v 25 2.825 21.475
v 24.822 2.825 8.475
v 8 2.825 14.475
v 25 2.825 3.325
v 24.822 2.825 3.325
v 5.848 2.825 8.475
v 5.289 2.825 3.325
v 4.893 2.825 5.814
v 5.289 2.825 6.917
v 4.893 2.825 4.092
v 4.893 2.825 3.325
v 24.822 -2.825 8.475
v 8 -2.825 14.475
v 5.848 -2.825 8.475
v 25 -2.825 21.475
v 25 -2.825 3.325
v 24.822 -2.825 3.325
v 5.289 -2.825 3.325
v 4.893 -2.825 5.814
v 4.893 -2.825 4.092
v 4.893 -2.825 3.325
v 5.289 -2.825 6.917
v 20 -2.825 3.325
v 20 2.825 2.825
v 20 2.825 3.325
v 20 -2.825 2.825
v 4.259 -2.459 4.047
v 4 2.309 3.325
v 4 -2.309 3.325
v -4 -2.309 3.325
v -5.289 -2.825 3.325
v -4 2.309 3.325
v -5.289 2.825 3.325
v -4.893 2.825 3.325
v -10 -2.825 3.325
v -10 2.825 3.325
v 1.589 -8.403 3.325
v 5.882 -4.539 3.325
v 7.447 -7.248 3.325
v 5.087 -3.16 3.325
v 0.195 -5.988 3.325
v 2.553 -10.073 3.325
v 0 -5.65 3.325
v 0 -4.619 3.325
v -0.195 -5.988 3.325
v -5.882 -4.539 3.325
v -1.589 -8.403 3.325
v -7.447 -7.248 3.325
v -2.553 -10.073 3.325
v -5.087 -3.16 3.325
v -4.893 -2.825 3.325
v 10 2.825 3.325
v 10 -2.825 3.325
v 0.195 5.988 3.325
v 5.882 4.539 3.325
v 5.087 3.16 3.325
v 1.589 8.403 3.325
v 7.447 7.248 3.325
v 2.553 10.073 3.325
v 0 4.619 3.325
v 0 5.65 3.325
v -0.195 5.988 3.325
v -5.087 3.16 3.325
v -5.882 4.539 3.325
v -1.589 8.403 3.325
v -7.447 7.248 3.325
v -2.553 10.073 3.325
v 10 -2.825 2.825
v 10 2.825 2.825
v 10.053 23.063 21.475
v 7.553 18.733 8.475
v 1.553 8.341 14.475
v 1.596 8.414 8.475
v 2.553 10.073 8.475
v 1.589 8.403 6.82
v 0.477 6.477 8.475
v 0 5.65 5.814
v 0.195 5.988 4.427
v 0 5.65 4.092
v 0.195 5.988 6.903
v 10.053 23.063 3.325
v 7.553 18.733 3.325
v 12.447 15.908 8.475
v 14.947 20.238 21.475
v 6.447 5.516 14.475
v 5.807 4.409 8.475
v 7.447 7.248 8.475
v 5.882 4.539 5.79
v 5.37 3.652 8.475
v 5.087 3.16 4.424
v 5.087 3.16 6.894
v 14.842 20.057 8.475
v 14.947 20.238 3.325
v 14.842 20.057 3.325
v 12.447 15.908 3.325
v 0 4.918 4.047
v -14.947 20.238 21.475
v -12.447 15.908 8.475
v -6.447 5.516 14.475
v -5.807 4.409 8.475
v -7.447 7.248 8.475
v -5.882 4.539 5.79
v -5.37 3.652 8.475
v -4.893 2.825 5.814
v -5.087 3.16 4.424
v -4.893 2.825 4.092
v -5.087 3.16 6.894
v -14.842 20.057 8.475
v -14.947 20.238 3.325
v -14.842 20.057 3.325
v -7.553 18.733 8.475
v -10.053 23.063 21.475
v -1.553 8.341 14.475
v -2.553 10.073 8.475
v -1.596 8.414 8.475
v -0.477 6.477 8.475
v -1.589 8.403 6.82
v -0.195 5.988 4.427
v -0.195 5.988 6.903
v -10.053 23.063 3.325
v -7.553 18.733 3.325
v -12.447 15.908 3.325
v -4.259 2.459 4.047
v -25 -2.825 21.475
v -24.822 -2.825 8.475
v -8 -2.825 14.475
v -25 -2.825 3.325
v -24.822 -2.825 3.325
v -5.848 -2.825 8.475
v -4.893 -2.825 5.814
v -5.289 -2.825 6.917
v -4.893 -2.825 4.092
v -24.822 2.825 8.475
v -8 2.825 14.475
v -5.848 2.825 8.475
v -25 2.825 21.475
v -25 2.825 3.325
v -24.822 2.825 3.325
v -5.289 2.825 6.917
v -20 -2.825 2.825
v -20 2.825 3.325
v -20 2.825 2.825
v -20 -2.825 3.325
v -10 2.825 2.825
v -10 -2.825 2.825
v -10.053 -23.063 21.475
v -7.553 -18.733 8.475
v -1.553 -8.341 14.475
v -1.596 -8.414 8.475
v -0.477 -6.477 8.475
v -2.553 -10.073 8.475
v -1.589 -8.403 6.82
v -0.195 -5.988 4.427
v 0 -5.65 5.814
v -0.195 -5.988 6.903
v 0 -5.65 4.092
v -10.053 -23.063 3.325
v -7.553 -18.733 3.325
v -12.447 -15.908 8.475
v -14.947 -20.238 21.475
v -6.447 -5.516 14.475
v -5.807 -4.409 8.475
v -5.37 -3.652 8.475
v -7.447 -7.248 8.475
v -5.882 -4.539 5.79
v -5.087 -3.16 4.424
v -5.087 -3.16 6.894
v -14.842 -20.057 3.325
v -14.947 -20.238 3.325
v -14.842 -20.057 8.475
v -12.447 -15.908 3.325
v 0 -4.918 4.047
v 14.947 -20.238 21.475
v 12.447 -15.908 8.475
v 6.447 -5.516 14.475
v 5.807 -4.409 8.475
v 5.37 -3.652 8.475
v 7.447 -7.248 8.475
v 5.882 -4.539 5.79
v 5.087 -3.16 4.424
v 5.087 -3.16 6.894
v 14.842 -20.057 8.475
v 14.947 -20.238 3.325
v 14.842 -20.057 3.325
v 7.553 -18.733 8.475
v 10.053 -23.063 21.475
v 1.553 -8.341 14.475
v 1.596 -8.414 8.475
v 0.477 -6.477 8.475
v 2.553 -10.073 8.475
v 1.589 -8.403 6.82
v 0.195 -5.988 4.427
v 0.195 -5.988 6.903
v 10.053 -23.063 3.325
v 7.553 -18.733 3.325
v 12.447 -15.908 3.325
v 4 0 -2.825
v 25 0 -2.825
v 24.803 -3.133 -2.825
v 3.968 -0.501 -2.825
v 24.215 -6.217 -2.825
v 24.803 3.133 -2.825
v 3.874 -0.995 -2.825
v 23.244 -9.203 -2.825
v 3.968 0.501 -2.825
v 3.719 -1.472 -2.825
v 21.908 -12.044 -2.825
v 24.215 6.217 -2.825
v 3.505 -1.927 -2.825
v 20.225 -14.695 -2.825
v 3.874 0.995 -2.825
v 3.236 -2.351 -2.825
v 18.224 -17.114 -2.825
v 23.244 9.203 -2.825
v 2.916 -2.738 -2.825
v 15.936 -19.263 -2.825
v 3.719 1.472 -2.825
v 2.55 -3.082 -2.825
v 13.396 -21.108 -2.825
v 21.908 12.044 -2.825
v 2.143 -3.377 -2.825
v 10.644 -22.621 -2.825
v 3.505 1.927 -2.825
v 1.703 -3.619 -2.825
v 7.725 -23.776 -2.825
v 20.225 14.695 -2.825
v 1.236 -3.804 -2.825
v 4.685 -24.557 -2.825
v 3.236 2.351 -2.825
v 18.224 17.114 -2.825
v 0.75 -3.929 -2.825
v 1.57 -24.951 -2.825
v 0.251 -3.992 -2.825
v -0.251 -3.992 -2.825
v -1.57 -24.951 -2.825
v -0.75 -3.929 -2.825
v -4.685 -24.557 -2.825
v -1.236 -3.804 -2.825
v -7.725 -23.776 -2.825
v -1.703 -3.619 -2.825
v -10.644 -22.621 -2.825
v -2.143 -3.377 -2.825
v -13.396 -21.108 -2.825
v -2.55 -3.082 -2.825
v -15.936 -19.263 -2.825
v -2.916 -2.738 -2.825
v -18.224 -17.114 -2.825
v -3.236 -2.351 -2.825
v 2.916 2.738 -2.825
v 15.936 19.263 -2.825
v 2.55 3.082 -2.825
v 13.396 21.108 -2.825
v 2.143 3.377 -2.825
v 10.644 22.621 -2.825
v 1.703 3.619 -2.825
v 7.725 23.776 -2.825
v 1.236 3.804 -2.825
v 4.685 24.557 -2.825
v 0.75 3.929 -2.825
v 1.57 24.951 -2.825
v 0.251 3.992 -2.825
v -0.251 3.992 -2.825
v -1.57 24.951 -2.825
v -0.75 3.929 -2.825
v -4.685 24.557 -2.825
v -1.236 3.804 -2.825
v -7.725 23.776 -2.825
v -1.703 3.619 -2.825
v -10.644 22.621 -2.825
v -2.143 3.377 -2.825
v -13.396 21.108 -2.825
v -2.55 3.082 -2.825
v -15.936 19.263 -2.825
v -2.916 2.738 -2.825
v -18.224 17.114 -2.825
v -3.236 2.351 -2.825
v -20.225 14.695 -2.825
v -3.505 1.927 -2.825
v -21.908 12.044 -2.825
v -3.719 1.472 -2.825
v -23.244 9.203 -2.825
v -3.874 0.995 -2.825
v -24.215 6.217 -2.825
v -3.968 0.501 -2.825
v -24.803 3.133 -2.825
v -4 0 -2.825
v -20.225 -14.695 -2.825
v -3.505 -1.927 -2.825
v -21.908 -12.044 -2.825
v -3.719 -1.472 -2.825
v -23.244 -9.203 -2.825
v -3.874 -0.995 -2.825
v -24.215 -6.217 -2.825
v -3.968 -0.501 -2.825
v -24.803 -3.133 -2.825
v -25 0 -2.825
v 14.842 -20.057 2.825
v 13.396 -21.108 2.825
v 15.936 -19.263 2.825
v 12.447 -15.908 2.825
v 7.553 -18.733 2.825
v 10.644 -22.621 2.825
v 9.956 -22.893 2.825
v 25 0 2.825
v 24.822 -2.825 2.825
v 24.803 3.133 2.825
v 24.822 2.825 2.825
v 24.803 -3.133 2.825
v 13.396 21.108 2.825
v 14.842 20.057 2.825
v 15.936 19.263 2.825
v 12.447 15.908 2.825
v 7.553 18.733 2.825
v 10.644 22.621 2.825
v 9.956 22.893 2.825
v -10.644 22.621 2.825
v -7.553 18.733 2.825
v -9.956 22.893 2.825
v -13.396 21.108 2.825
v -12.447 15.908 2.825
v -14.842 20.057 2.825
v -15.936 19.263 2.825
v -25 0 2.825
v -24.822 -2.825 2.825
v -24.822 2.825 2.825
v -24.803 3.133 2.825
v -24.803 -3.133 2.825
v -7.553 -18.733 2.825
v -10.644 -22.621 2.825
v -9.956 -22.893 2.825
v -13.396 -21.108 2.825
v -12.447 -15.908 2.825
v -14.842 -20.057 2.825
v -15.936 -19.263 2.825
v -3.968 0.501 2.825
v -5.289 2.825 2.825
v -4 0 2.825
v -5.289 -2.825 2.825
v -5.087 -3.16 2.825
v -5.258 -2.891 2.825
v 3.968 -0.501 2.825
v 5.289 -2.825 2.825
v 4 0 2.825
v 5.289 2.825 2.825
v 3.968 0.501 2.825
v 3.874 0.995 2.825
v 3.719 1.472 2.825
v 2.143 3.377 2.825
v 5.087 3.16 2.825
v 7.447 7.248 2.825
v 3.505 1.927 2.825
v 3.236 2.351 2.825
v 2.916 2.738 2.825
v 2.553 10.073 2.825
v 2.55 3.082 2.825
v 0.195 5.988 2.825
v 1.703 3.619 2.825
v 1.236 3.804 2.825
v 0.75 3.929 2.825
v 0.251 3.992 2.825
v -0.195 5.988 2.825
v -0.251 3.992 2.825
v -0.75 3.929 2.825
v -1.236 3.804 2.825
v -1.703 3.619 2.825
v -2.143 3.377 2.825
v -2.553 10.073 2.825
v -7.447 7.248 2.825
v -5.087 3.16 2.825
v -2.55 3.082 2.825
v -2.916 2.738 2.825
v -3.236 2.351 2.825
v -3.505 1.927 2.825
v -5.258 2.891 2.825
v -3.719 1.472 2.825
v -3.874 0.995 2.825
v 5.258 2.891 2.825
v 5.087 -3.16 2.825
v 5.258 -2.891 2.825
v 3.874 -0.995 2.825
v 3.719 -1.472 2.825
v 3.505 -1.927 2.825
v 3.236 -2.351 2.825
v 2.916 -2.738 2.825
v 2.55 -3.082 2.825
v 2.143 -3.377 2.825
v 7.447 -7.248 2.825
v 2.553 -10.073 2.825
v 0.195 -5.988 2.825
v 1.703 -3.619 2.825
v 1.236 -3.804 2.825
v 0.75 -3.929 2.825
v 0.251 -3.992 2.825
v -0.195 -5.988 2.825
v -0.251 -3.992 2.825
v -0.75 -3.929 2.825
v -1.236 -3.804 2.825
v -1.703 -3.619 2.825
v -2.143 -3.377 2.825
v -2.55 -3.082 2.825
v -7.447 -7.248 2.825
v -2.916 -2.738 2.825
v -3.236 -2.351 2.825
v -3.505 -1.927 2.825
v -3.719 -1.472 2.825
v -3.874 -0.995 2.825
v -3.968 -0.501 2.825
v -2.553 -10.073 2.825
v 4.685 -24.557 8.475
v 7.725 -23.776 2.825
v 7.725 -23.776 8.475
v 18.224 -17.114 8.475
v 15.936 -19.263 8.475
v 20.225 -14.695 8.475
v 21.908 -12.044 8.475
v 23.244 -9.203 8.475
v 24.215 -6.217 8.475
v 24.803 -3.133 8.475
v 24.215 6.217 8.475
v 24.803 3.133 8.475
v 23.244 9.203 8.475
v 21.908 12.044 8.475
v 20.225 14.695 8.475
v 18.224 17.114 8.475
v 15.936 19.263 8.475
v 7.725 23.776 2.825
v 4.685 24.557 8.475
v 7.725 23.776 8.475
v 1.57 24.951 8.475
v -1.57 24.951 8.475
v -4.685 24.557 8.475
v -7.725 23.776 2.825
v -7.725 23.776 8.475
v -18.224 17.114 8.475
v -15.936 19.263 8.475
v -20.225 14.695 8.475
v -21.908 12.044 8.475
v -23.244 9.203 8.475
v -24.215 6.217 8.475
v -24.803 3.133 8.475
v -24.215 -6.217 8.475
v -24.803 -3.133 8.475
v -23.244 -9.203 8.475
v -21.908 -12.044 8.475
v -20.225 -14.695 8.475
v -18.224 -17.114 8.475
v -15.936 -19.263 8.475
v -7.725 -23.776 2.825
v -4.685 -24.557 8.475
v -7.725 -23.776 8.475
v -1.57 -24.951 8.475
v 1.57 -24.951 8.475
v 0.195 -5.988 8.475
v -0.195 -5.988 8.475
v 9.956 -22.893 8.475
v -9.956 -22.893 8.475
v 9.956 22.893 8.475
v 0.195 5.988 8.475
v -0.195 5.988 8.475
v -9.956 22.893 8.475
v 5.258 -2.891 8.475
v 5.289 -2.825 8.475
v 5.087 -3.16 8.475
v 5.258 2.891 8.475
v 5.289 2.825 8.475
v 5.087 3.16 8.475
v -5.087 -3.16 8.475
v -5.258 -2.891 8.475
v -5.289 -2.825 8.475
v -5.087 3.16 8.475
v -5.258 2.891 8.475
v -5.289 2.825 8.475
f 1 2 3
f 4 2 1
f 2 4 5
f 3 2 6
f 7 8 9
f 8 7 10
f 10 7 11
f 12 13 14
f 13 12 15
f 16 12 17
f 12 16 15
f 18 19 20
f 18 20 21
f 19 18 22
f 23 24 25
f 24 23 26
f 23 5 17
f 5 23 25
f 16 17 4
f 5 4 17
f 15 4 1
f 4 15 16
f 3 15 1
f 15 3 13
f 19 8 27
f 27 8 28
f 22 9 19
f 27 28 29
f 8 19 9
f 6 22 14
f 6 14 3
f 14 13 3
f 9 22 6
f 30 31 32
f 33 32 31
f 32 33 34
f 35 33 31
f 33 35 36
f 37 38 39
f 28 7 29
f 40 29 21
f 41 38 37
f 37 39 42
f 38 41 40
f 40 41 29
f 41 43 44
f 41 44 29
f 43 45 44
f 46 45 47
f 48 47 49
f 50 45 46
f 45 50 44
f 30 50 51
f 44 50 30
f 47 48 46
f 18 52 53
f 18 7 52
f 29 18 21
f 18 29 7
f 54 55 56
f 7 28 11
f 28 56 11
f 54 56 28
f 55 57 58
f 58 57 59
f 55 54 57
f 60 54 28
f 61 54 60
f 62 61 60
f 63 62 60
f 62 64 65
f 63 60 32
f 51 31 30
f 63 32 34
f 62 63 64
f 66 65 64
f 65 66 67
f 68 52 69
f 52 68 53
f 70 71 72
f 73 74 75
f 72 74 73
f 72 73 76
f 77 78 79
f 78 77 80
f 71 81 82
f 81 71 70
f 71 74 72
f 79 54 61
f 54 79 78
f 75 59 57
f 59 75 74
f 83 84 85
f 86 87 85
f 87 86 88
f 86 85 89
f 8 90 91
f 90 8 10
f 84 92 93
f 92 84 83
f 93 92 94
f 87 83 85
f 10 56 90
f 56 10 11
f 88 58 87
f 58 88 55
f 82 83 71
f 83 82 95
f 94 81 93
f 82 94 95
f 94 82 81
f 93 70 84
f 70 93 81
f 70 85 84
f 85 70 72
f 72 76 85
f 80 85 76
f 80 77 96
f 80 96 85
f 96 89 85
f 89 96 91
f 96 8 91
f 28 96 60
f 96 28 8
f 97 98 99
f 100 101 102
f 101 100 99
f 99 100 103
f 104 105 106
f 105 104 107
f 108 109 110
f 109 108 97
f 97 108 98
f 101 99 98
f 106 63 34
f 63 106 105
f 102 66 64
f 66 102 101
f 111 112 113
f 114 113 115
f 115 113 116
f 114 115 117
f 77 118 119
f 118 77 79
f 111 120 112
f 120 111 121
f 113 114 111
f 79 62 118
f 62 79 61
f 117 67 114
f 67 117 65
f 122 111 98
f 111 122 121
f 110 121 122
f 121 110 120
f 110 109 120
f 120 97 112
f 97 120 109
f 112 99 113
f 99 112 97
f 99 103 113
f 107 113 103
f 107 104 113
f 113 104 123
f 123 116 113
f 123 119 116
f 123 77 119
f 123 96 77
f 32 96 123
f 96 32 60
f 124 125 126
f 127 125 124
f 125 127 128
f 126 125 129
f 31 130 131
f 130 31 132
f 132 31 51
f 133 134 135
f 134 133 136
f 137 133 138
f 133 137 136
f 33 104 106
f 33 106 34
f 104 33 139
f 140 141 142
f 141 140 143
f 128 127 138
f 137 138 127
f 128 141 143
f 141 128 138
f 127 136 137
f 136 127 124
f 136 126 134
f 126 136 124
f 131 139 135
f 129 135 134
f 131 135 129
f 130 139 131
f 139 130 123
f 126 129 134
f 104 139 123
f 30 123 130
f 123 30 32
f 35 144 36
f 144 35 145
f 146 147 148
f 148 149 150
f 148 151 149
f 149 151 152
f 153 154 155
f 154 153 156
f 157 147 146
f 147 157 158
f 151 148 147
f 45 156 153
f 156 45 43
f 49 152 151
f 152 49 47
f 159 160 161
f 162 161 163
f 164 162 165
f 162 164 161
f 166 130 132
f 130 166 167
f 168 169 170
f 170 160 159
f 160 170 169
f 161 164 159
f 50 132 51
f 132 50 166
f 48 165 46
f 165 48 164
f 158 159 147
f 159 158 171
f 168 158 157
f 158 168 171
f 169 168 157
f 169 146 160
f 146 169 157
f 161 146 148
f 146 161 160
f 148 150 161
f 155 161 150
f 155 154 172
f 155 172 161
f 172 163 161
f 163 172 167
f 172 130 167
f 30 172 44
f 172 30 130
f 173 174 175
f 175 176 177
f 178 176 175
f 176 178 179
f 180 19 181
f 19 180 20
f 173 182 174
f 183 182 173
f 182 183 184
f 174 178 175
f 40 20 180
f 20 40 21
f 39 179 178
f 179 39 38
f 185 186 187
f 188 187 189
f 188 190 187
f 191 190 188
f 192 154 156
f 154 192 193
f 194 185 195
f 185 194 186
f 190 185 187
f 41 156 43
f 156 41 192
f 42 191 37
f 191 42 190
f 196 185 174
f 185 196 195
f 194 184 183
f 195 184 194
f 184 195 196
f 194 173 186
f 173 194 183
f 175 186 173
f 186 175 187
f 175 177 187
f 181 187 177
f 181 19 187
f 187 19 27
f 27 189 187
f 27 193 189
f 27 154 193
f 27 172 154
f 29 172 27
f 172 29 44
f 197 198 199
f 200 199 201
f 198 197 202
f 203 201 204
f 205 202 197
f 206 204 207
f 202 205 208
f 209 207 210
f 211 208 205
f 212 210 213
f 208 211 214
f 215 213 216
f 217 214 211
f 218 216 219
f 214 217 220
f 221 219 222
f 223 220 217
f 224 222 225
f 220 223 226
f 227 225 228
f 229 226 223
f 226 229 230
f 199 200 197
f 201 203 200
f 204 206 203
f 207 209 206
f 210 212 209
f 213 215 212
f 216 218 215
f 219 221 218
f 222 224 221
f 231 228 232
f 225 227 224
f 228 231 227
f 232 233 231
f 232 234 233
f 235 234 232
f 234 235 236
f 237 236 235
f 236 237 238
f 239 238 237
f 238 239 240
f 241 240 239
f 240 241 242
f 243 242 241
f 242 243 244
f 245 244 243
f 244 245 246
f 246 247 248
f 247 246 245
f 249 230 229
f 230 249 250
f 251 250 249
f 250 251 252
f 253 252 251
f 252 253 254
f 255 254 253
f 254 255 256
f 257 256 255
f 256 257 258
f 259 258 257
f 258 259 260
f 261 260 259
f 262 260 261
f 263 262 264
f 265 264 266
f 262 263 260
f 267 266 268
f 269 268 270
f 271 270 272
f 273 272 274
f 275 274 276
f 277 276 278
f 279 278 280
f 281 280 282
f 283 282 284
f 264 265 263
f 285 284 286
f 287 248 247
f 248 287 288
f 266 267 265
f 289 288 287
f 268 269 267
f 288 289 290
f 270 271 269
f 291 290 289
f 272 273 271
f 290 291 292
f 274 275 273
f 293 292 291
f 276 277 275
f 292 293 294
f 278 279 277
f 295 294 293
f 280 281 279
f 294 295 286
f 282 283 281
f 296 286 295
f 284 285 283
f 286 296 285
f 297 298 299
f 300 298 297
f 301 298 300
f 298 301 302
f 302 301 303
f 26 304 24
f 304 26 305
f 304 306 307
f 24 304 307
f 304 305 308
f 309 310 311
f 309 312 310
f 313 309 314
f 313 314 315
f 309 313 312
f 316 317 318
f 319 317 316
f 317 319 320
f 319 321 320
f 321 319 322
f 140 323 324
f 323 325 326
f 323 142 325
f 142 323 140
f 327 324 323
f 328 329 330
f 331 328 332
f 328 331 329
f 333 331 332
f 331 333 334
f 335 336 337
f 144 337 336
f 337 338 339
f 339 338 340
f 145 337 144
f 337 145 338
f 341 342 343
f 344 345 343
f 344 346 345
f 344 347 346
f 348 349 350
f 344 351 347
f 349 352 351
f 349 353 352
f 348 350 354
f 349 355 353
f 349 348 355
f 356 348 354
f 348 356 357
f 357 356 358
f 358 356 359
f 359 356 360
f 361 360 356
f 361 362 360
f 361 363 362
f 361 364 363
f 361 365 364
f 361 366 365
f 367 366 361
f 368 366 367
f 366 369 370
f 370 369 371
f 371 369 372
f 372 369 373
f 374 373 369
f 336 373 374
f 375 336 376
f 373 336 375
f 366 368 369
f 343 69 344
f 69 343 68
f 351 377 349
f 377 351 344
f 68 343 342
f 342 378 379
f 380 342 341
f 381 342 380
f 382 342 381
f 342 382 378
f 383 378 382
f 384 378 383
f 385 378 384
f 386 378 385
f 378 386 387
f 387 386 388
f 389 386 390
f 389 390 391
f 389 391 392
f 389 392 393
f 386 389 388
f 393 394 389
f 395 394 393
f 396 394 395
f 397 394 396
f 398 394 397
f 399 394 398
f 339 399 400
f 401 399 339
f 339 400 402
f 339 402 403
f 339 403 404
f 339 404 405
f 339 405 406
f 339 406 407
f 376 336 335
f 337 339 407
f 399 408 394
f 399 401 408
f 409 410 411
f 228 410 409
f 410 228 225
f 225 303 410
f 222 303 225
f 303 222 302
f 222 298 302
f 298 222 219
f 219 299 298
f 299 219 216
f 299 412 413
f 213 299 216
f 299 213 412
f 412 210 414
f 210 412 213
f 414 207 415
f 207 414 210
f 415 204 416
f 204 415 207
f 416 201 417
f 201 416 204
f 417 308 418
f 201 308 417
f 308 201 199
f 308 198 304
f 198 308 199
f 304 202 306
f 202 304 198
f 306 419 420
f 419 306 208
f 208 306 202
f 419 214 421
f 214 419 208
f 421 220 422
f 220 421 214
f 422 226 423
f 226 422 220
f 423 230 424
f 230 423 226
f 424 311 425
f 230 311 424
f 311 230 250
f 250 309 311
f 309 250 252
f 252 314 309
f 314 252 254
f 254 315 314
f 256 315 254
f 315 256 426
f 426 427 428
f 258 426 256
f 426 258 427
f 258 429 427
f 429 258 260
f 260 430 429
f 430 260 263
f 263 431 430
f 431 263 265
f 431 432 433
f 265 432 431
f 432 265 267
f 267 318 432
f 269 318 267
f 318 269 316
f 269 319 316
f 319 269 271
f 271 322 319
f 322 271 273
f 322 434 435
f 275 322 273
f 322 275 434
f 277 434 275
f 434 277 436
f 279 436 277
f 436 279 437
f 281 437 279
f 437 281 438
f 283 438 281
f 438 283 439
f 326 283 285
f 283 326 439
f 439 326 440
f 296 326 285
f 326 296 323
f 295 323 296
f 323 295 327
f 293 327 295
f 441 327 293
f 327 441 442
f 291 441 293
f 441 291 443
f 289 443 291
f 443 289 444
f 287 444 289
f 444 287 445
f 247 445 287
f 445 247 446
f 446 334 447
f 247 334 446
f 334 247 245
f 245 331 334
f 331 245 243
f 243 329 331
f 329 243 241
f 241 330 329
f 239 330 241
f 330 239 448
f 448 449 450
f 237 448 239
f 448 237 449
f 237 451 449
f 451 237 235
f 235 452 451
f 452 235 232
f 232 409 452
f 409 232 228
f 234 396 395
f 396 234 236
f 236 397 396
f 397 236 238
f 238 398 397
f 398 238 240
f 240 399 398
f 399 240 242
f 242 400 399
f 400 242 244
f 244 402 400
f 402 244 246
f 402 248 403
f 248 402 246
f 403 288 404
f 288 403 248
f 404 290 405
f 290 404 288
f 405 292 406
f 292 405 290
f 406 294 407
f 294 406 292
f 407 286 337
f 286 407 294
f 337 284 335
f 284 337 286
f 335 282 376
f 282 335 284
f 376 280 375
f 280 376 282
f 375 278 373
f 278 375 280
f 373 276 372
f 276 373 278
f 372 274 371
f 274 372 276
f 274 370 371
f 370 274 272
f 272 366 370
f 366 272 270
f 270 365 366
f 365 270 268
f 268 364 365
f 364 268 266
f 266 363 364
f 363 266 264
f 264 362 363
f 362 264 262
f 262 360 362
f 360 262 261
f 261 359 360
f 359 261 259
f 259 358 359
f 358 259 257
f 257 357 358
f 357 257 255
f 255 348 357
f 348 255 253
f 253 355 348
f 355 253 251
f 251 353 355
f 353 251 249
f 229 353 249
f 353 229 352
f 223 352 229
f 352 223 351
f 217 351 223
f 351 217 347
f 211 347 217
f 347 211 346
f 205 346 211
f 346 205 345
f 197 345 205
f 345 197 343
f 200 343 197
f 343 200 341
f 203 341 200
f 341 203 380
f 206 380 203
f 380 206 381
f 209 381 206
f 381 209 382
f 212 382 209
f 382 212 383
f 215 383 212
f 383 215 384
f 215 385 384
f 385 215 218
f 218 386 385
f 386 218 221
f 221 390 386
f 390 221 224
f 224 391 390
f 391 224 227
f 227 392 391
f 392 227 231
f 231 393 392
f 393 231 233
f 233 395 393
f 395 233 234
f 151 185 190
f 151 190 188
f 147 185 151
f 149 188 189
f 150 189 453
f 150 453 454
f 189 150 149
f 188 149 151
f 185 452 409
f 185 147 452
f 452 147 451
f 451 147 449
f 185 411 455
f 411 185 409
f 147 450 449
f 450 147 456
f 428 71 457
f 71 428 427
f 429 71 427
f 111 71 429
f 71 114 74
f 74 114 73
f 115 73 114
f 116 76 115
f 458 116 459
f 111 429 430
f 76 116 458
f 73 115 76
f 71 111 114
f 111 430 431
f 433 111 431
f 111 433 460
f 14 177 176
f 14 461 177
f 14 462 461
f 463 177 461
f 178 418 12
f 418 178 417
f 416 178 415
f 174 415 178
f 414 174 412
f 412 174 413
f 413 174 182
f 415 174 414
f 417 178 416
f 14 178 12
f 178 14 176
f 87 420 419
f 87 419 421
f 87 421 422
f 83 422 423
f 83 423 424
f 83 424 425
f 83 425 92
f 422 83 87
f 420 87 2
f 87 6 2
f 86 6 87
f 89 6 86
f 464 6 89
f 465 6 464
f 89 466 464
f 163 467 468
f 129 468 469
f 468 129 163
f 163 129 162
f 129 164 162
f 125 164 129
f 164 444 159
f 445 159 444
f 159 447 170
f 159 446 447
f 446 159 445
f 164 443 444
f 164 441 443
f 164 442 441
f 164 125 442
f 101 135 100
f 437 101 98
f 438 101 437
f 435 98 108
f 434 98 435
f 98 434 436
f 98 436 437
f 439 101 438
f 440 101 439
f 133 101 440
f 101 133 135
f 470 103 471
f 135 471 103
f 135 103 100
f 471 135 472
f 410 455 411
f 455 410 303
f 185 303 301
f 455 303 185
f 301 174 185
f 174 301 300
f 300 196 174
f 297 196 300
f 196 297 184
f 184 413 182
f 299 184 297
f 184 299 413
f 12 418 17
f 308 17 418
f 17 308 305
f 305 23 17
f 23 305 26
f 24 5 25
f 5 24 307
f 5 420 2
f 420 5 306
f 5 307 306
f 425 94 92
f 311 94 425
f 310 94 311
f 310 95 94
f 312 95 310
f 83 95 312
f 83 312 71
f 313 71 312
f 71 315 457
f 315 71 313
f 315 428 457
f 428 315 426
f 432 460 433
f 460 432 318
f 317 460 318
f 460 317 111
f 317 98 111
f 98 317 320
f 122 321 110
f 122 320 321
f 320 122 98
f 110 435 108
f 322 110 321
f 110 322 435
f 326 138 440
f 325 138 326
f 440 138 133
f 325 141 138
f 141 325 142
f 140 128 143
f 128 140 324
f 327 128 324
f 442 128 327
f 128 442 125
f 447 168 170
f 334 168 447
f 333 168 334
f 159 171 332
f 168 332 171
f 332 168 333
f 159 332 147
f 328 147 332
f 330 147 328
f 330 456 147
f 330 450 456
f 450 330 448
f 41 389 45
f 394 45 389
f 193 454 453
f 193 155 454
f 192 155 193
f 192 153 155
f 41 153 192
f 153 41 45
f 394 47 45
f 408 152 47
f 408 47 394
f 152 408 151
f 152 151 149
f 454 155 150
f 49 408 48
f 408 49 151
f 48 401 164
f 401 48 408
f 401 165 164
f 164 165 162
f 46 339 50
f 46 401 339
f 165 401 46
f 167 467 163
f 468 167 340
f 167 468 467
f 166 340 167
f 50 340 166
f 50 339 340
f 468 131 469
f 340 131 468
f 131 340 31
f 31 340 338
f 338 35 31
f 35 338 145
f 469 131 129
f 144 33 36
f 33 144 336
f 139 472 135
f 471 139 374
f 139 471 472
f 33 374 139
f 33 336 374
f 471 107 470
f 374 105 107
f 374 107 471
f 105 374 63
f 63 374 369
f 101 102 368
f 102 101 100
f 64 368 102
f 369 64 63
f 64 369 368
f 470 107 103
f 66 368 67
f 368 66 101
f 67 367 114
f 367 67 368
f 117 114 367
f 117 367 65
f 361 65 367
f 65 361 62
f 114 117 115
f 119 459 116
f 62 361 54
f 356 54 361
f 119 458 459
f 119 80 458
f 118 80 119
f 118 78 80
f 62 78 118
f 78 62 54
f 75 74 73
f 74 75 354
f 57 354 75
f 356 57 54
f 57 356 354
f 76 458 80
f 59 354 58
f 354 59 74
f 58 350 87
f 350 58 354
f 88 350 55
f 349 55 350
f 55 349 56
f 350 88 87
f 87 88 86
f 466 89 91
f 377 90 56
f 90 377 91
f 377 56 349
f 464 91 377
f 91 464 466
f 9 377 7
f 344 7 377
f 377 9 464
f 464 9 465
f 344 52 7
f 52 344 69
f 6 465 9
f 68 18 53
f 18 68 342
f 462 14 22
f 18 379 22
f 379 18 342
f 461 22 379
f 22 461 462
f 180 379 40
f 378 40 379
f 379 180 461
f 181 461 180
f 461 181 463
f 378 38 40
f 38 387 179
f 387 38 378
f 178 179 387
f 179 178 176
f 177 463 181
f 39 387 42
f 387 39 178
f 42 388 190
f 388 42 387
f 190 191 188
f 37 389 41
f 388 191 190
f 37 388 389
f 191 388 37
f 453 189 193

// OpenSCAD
// file: formulas.scad
  
//Distance between 2 points
function distance(p1, p2) = sqrt(pow(p2[0]-p1[0], 2) + pow(p2[1]-p1[1], 2));
  
// distance between 2 arc end points
function arc_distance(r, depth) = sqrt(8*r*depth - 4*pow(depth, 2));
// file: 2dTimingPulleyCutout.scad
include <dimensions.scad>;

// By Rob Gilson
// Based on a script by Erik de Bruijn <reprap@erikdebruijn.nl> 
// License: GPLv2 or later
//
// Goal: the goal of this parametric model is to generate a high quality custom timing pulley that is cuttable by a laser cutter or 3 axis cnc mill.
// NOTE: The diameter of the gear parts are determined by the belt's pitch and number of teeth on a pully.

// //////////////////////////////
// USER PARAMETERS
// //////////////////////////////

// Pulley properties
//shaftDiameter = 4.85; // the shaft at the center, will be subtracted from the pulley. Better be too small than too wide.
//numTeeth = 11; // this value together with the pitch determines the pulley diameter
//toothType = 3; // 1 = slightly rounded, 2 = oval sharp, 3 = square. For square, set the toothWith a little low. (TODO, not yet implemented)
//
//// Belt properties:
//pitch = 2; // distance between the teeth
//beltThickness = 1.2; // thickness of the part excluding the notch depth!
//beltWidth = 5; // the width/height of the belt. The (vertical) size of the pulley is adapted to this.
//notchDepth = 2.4-1.2; // make it slightly bigger than actual, there's an outward curvature in the inner solid part of the pulley
//toothWidth = 2; // Teeth of the PULLEY, that is.

//Nut Trap Properties
//screwWidth = 1.5; //The width of the screw hole (make this slightly larger then the screw)
//The width and length of the nut to make the nut trap
//nutWidth = 3; //The width of the nut trap (dimension perpendicular to the screw)
//nutLength = 2;//The length of the nut trap (dimension along the screw)

//Assembly properties:
//sideScrews = true; //If true generates 2 screw holes through the lenght of the pulley to use to hold it together instead of gluing the layers together.
//setScrew = true; //if true generates a nut trap for a set screw to hold the pulley to the motor shaft.

//Layer Material properties:
//materialThickness = 5.95; //TODO: the thickness of your layer material (to determine how many layers to cut)

//DXF Generation options (allows cutting of individual components)
//pulley = true; //enables rendering of the pulley
//beltguide = true;//enables rendering of the belt guide

// //////////////////////////////
// OpenSCAD SCRIPT
// //////////////////////////////

$fs=0.2; // def 1, 0.2 is high res 
$fa=3; //def 12, 3 is very nice


//Pulley Component
module pulley() {
}

// Cogs plate
module pulley_cogs(numTeeth=11, shaftDiameter=4.95, materialThickness=6, screwWidth=3/2) {
  pulleyRadius = pitch*numTeeth/(PI*2) - notchDepth; 
  shaftRadius = shaftDiameter/2;
  //	for (layer = [0:(beltWidth/materialThickness)])
  //		translate(v = [(pulleyRadius+notchDepth+1)*layer*2,0,0]) 

  linear_extrude(materialThickness) {
  pulleyOutline(pulleyRadius, shaftRadius, pulleyRadius, screwWidth);
  for ( i = [0:numTeeth] ) {
      rotate(a = [0,0,i*360/numTeeth])
      {
          translate(v = [pulleyRadius, 0, 0])
          {
              //tooth profile (toothType = 2)
              square(size = [notchDepth,toothWidth], center = true);
              translate(v = [notchDepth*0.5, 0, 0])
                  scale([notchDepth/4, toothWidth/2, 1]) 
                      circle(r=1);
          }
      }
   }
  }
}

//Nut Trap Clamp/Belt Guide Component
module pulley_beltguide(numTeeth=11, shaftDiameter=4.95, materialThickness=6, screwWidth=3/2) {
  pulleyRadius = pitch*numTeeth/(PI*2) - notchDepth; 
  shaftRadius = shaftDiameter/2;
  linear_extrude(materialThickness)
  pulleyOutline(pulleyRadius+notchDepth+beltThickness, shaftRadius, pulleyRadius, screwWidth);
}

//Nut Trap Component
module pulley_setscrew() {
  difference()
  {
    pulleyOutline(pulleyRadius+notchDepth, shaftRadius, pulleyRadius);
    union()
    {
      translate([0,-screwWidth/2])
        square([pulleyRadius+notchDepth,screwWidth], center=false);
      translate([(pulleyRadius+shaftRadius+notchDepth)/2,0])
        square([nutLength,nutWidth], center=true);
    }
  }
}

//Pulley Outline Module
module pulleyOutline(r, shaftRadius, pulleyRadius, screwWidth)
{
	difference()
	{
		circle(r=r, center=true); //outer
		union()
		{
			circle(r=shaftRadius, center=true); //shaft
				translate([0,(pulleyRadius+shaftRadius)/2,0])
				circle(screwWidth,true);
				translate([0,-(pulleyRadius+shaftRadius)/2,0])
				circle(screwWidth,true);
		}
	}
}

pulley_beltguide(62, 8, 6, 3/2);
translate([0, 0, 6]) pulley_cogs(62, 8, 6, 3/2);
// file: dimensions.scad
use <formulas.scad>;

$fn=50;
export_fn=100;
export_scale=0.03937; // scales down mm->inches (useful if your laser cutter uses inches)
cut_diam=0.2;

// Global
PI = 3.15159265; 


span_bottle=100; 
bottle_rod_diam=10; 
front_rod_diam=10; 
width=470;
span_bottom=160; // Bottom rods span
span_bottle=120; // Bottle rods span
board_thickness=5.65;
nut_t=6;
back_tilt_angle=20;

cable_diam=1.7;

bushings_diam=15;
bushings_length=24;
bushings_hole_length=24.2;

strap_hole_dim=[4, 2];
strap_margin=3;

// Bottle grip
bottle_axle_diam=8;
bottle_axle_pos=[span_bottom-sin(back_tilt_angle)*span_bottle/2, cos(back_tilt_angle)*span_bottle/2];

bottle_grip_bottom_diam=90;
bottle_grip_bottom_height=6;
bottle_grip_bottom_cone_height=4;

bottle_grip_top_diam=50;
bottle_grip_top_height=7;
bottle_grip_top_cone_height=20;
bottle_grip_top_diam=50;
bottle_grip_top_inner_diam=45;
bottle_pulley_teeth=62;


// Sides
holes_margin=25; 
axle_position=[0,0];
break_position=[70, 50];
axis_z=40;
bearing_extrusion_height=7.2;
bearing_extrusion_length=24;
bearing_axle_length=20;
bearing_id=8;

//x_top_rod_position=[0,bottle_axle_pos[1] + x_rods_span/2];
bottom_extrusion_height=5;
bottle_top_rod_position=[span_bottom-sin(back_tilt_angle)*span_bottle, cos(back_tilt_angle)*span_bottle];

// Right wall
bottle_axis_diam=15;
stepper_slide_distance=0;
a_stepper_pos=[span_bottom*0.4, 10];
stepper_rotation=0; //atan((bottle_axle_pos[1]-a_stepper_pos[1])/(bottle_axle_pos[0]-a_stepper_pos[0]));


// Left wall

// X table
x_carriage_pos=width/5;
x_a_distance=85;
x_table_tilt=0;
x_rods_span=50;
rod_ext=8;
table_rod_ext=0;
table_rods_diam=8;

// X stepper mount
x_stepper_mount_length = 50;
x_stepper_mount_width = x_rods_span + 10;
x_stepper_mount_shift=(22-9)/2;

x_table_width=width - board_thickness*2;

// X carriage
//carriage_length= 24; // single bushing
carriage_length=65; // double bushings
carriage_height=x_rods_span+20;
carriage_rounding_radius = 10;
carriage_bushing_hole_width = 10.5;
z_rods_length=70;
z_rods_diam=8;
z_bar_width=20;
z_pos=-10;
z_bushings_diam=15;
z_bolt_diam=3;
z_rods_span=41;
z_bushings_pos = x_rods_span/2;
solenoid_dim = [27, 22, 25];
solenoid_pos=0;
plate_distance = sqrt(pow(bushings_diam/2, 2) - pow(carriage_bushing_hole_width/2, 2)) + board_thickness/2; // Calculates plate distance (depending on carriage_bushing_hole_width
echo("Plate distance:", plate_distance*2 + board_thickness);
z_plate_dist = 5;
z_bushings_hole_width = 2*sqrt(pow(bushings_diam/2, 2) - pow(z_plate_dist, 2));

// Calculations for x table position
xz_span = plate_distance + z_plate_dist + board_thickness/2;
x_top_rod_position=[bottle_axle_pos[0] - cos(x_table_tilt)*(x_a_distance) + sin(x_table_tilt)*(-xz_span), bottle_axle_pos[1] + sin(x_table_tilt)*(x_a_distance) + cos(x_table_tilt)*(-xz_span)];
x_btm_rod_position=[bottle_axle_pos[0] - cos(x_table_tilt)*(x_a_distance + x_rods_span) + sin(x_table_tilt)*(-xz_span), bottle_axle_pos[1] + sin(x_table_tilt)*(x_a_distance + x_rods_span) + cos(x_table_tilt)*(-xz_span)];

toolbit_mount_diam=4.8;

// Bottle
bottle_pos=40;
bottle_diam=100;
bottle_height=360;

// Bottle bar
bottle_bar_width=40;
bottle_bar_height=span_bottle;
bottle_bar_pos=bottle_height+bottle_pos+30;

bearing_hole_diam=13;
bearing_guide_diam=22;


// Pulley properties
shaftDiameter = 8; // the shaft at the center, will be subtracted from the pulley. Better be too small than too wide.
hubDiameter = 30; // if the hub or timing pulley is big enough to fit a nut, this will be embedded.
hubHeight = 8; // the hub is the thick cylinder connected to the pulley to allow a set screw to go through or as a collar for a nut.
flanges = 2; // the rims that keep the belt from going anywhere
hubSetScewDiameter = 0; // use either a set screw or nut on a shaft. Set to 0 to not use a set screw.
numSetScrews = 3;
bottle_pulley_teeth = ceil(7.1*16); // this value together with the pitch determines the pulley diameter
echo("Teeth:", bottle_pulley_teeth);

toothType = 1; // 1 = slightly rounded, 2 = oval sharp, 3 = square. For square, set the toothWith a little low.

// Belt properties:
pitch = 2; // distance between the teeth
beltWidth = 6; // the width/height of the belt. The (vertical) size of the pulley is adapted to this.
beltThickness = 0.63; // thickness of the part excluding the notch depth!
notchDepth = 0.75; // make it slightly bigger than actual, there's an outward curvature in the inner solid part of the pulley
toothWidth = 1.2; // Teeth of the PULLEY, that is.
pulleyRadius = pitch*bottle_pulley_teeth/(PI*2) - notchDepth;

a_stepper_teeth=11;
a_stepper_pulley_radius=4.2;


// Belt tensioner
echo(belt_tensioner_position[1], "Tensioner position");
echo(a_stepper_pulley_radius, "11t radius");
belt_tensioner_bolt_diam=7.8;
belt_tensioner_elevation=8;
belt_tensioner_stroke=10;
belt_tensioner_axle_margin=3;
belt_tensioner_xpos = 105;
belt_tensioner_position=[belt_tensioner_xpos, a_stepper_pos[1] - a_stepper_pulley_radius + (bottle_axle_pos[1] - pulleyRadius - a_stepper_pos[1] + a_stepper_pulley_radius)/(bottle_axle_pos[0] - a_stepper_pos[0])*(belt_tensioner_xpos-a_stepper_pos[0]) + belt_tensioner_stroke/2 - 22/2];
// main file
include <dimensions.scad>;
use <2dTimingPulleyCutout.scad>;

/*
module btm_grip_support() {
  t = board_thickness-0.2;
  margin = 5;
  linear_extrude(t, center=true)
  union() {
    difference() {
      union() {
        translate([0, t + margin]) scale([bottle_grip_bottom_diam/2, bottle_grip_bottom_height]) circle();
        square([bottle_grip_bottom_diam/2, t + margin]);
      }
      union() {
        mirror([1, 0, 0]) square([1000, 1000]);
        mirror([0, 1, 0]) translate([-500, 0, 0]) square([1000, 1000]);
       translate([0, -1]) square([bottle_axle_diam/2 + 1, t + 2]);
       translate([0, t]) square([14.2/2, bottle_grip_bottom_height + margin + 1]);
       translate([bottle_axle_diam + 5, -1]) square([t*2, t+1]);
       translate([bottle_grip_bottom_diam/2 - t - 4, -1]) square([t, t+1]);
       square([bottle_grip_bottom_diam/2 - t - 4, 0.5]);
      }
    }
  points=[[0, 0], [-5, 0], [0, -3]];
  translate([bottle_grip_bottom_diam/2, 0]) polygon(points);
  //translate([bottle_axle_diam + 1, 0]) mirror([1, 0, 0]) polygon(points);
  }
  
}
*/

module btm_grip_support() {
  t = board_thickness;
  l=bottle_grip_bottom_diam/2;
  margin=6;

  points = [
    [bottle_axle_diam/2, 0.5],
    [15, 0.5],
    [15, t],
    [20, t],
    [20, 0.5],
    [30, 0.5],
    [30, t],
    [35, t],
    [35, 0.5],
    [l, 0.5],
    [l, t + margin],
    [16/2, t + margin + bottle_grip_bottom_height],
  ];

  linear_extrude(t, center=true)
    polygon(points);
}

module top_grip_support() {
  t = board_thickness;
  l=bottle_grip_top_diam/2;
  margin=6;

  points = [
    [bottle_axle_diam/2, 0.5],
    [10, 0.5],
    [10, t],
    [20, t],
    [20, 0.5],
    [30, 0.5],
    [l, 0.5],
    [l, t + margin + bottle_grip_top_height],
    [16/2, t + margin],
  ];

  linear_extrude(t, center=true)
    polygon(points);
}

module top_plate() {
  t = board_thickness;
  linear_extrude(board_thickness, center=true)
  difference() {
    circle(r=bottle_grip_top_diam/2);
    circle(r=bottle_axle_diam/2 + 2);
    union() {
      for (i=[0:6]) {
        rotate(i*360/6, [0, 0, 1])
          projection(cut=true) translate([0, 0, -t/2]) rotate([90, 0, 0]) top_grip_support();
      }
    }
  }
}

/*module btm_plate() {
  t = board_thickness - 0.2;
  linear_extrude(board_thickness, center=true)
  difference() {
    circle(r=bottle_grip_bottom_diam/2);
    circle(r=bottle_axle_diam/2 + 2);
    union() {
      for (i=[0:6]) {
        rotate(i*360/6, [0, 0, 1])
          projection(cut=true) translate([0, 0, -t/2]) rotate([90, 0, 0]) btm_grip_support();
      }
    }
  }
}*/

module pulley() {
  pulley_cogs(numTeeth=bottle_pulley_teeth, shaftDiameter=bottle_axle_diam, materialThickness=board_thickness);
}

module beltguide() {
  pulley_beltguide(numTeeth=bottle_pulley_teeth, shaftDiameter=bottle_axle_diam, materialThickness=board_thickness);
}

module btm_plate() {
  t = board_thickness;
  linear_extrude(board_thickness, center=true)
  difference() {
    circle(r=bottle_grip_bottom_diam/2);
    circle(r=bottle_axle_diam/2 + 2);
    union() {
      for (i=[0:6]) {
        rotate(i*360/6, [0, 0, 1])
          projection(cut=true) translate([0, 0, -t/2]) rotate([90, 0, 0]) btm_grip_support();
      }
    }
  }
}


module btm_plate2() {
  linear_extrude(board_thickness, center=true) 
  difference() {
    circle(r=bottle_grip_bottom_diam/2);
    circle(bottle_axle_diam/2);
  }
}

module top_plate2() {
  linear_extrude(board_thickness, center=true) 
  difference() {
    circle(r=bottle_grip_top_diam/2);
    circle(bottle_axle_diam/2);
  }
}

module bottom_grip() {
  beltguide();
  translate([0, 0, board_thickness]) pulley();
  translate([0, 0, board_thickness*2]) beltguide();
  translate([0, 0, board_thickness*3.5]) {
    btm_plate();
    for (i=[0:6]) {
      rotate(i*360/6, [0, 0, 1])
      translate([0, 0, -board_thickness/2]) rotate([90, 0, 0]) btm_grip_support(tol=0);
    }
  }
}

module top_grip() {
  top_plate2();
  translate([0, 0, board_thickness]) top_plate();
  translate([0, 0, board_thickness]) 
  for (i=[0:6]) {
    rotate(i*360/6, [0, 0, 1])
    translate([0, 0, -board_thickness/2]) rotate([90, 0, 0]) top_grip_support();
  }
}

//bottom_grip();
//btm_grip_support();
//btm_plate();
//bottom_grip();
//top_grip_support();
//top_plate();
top_grip();
